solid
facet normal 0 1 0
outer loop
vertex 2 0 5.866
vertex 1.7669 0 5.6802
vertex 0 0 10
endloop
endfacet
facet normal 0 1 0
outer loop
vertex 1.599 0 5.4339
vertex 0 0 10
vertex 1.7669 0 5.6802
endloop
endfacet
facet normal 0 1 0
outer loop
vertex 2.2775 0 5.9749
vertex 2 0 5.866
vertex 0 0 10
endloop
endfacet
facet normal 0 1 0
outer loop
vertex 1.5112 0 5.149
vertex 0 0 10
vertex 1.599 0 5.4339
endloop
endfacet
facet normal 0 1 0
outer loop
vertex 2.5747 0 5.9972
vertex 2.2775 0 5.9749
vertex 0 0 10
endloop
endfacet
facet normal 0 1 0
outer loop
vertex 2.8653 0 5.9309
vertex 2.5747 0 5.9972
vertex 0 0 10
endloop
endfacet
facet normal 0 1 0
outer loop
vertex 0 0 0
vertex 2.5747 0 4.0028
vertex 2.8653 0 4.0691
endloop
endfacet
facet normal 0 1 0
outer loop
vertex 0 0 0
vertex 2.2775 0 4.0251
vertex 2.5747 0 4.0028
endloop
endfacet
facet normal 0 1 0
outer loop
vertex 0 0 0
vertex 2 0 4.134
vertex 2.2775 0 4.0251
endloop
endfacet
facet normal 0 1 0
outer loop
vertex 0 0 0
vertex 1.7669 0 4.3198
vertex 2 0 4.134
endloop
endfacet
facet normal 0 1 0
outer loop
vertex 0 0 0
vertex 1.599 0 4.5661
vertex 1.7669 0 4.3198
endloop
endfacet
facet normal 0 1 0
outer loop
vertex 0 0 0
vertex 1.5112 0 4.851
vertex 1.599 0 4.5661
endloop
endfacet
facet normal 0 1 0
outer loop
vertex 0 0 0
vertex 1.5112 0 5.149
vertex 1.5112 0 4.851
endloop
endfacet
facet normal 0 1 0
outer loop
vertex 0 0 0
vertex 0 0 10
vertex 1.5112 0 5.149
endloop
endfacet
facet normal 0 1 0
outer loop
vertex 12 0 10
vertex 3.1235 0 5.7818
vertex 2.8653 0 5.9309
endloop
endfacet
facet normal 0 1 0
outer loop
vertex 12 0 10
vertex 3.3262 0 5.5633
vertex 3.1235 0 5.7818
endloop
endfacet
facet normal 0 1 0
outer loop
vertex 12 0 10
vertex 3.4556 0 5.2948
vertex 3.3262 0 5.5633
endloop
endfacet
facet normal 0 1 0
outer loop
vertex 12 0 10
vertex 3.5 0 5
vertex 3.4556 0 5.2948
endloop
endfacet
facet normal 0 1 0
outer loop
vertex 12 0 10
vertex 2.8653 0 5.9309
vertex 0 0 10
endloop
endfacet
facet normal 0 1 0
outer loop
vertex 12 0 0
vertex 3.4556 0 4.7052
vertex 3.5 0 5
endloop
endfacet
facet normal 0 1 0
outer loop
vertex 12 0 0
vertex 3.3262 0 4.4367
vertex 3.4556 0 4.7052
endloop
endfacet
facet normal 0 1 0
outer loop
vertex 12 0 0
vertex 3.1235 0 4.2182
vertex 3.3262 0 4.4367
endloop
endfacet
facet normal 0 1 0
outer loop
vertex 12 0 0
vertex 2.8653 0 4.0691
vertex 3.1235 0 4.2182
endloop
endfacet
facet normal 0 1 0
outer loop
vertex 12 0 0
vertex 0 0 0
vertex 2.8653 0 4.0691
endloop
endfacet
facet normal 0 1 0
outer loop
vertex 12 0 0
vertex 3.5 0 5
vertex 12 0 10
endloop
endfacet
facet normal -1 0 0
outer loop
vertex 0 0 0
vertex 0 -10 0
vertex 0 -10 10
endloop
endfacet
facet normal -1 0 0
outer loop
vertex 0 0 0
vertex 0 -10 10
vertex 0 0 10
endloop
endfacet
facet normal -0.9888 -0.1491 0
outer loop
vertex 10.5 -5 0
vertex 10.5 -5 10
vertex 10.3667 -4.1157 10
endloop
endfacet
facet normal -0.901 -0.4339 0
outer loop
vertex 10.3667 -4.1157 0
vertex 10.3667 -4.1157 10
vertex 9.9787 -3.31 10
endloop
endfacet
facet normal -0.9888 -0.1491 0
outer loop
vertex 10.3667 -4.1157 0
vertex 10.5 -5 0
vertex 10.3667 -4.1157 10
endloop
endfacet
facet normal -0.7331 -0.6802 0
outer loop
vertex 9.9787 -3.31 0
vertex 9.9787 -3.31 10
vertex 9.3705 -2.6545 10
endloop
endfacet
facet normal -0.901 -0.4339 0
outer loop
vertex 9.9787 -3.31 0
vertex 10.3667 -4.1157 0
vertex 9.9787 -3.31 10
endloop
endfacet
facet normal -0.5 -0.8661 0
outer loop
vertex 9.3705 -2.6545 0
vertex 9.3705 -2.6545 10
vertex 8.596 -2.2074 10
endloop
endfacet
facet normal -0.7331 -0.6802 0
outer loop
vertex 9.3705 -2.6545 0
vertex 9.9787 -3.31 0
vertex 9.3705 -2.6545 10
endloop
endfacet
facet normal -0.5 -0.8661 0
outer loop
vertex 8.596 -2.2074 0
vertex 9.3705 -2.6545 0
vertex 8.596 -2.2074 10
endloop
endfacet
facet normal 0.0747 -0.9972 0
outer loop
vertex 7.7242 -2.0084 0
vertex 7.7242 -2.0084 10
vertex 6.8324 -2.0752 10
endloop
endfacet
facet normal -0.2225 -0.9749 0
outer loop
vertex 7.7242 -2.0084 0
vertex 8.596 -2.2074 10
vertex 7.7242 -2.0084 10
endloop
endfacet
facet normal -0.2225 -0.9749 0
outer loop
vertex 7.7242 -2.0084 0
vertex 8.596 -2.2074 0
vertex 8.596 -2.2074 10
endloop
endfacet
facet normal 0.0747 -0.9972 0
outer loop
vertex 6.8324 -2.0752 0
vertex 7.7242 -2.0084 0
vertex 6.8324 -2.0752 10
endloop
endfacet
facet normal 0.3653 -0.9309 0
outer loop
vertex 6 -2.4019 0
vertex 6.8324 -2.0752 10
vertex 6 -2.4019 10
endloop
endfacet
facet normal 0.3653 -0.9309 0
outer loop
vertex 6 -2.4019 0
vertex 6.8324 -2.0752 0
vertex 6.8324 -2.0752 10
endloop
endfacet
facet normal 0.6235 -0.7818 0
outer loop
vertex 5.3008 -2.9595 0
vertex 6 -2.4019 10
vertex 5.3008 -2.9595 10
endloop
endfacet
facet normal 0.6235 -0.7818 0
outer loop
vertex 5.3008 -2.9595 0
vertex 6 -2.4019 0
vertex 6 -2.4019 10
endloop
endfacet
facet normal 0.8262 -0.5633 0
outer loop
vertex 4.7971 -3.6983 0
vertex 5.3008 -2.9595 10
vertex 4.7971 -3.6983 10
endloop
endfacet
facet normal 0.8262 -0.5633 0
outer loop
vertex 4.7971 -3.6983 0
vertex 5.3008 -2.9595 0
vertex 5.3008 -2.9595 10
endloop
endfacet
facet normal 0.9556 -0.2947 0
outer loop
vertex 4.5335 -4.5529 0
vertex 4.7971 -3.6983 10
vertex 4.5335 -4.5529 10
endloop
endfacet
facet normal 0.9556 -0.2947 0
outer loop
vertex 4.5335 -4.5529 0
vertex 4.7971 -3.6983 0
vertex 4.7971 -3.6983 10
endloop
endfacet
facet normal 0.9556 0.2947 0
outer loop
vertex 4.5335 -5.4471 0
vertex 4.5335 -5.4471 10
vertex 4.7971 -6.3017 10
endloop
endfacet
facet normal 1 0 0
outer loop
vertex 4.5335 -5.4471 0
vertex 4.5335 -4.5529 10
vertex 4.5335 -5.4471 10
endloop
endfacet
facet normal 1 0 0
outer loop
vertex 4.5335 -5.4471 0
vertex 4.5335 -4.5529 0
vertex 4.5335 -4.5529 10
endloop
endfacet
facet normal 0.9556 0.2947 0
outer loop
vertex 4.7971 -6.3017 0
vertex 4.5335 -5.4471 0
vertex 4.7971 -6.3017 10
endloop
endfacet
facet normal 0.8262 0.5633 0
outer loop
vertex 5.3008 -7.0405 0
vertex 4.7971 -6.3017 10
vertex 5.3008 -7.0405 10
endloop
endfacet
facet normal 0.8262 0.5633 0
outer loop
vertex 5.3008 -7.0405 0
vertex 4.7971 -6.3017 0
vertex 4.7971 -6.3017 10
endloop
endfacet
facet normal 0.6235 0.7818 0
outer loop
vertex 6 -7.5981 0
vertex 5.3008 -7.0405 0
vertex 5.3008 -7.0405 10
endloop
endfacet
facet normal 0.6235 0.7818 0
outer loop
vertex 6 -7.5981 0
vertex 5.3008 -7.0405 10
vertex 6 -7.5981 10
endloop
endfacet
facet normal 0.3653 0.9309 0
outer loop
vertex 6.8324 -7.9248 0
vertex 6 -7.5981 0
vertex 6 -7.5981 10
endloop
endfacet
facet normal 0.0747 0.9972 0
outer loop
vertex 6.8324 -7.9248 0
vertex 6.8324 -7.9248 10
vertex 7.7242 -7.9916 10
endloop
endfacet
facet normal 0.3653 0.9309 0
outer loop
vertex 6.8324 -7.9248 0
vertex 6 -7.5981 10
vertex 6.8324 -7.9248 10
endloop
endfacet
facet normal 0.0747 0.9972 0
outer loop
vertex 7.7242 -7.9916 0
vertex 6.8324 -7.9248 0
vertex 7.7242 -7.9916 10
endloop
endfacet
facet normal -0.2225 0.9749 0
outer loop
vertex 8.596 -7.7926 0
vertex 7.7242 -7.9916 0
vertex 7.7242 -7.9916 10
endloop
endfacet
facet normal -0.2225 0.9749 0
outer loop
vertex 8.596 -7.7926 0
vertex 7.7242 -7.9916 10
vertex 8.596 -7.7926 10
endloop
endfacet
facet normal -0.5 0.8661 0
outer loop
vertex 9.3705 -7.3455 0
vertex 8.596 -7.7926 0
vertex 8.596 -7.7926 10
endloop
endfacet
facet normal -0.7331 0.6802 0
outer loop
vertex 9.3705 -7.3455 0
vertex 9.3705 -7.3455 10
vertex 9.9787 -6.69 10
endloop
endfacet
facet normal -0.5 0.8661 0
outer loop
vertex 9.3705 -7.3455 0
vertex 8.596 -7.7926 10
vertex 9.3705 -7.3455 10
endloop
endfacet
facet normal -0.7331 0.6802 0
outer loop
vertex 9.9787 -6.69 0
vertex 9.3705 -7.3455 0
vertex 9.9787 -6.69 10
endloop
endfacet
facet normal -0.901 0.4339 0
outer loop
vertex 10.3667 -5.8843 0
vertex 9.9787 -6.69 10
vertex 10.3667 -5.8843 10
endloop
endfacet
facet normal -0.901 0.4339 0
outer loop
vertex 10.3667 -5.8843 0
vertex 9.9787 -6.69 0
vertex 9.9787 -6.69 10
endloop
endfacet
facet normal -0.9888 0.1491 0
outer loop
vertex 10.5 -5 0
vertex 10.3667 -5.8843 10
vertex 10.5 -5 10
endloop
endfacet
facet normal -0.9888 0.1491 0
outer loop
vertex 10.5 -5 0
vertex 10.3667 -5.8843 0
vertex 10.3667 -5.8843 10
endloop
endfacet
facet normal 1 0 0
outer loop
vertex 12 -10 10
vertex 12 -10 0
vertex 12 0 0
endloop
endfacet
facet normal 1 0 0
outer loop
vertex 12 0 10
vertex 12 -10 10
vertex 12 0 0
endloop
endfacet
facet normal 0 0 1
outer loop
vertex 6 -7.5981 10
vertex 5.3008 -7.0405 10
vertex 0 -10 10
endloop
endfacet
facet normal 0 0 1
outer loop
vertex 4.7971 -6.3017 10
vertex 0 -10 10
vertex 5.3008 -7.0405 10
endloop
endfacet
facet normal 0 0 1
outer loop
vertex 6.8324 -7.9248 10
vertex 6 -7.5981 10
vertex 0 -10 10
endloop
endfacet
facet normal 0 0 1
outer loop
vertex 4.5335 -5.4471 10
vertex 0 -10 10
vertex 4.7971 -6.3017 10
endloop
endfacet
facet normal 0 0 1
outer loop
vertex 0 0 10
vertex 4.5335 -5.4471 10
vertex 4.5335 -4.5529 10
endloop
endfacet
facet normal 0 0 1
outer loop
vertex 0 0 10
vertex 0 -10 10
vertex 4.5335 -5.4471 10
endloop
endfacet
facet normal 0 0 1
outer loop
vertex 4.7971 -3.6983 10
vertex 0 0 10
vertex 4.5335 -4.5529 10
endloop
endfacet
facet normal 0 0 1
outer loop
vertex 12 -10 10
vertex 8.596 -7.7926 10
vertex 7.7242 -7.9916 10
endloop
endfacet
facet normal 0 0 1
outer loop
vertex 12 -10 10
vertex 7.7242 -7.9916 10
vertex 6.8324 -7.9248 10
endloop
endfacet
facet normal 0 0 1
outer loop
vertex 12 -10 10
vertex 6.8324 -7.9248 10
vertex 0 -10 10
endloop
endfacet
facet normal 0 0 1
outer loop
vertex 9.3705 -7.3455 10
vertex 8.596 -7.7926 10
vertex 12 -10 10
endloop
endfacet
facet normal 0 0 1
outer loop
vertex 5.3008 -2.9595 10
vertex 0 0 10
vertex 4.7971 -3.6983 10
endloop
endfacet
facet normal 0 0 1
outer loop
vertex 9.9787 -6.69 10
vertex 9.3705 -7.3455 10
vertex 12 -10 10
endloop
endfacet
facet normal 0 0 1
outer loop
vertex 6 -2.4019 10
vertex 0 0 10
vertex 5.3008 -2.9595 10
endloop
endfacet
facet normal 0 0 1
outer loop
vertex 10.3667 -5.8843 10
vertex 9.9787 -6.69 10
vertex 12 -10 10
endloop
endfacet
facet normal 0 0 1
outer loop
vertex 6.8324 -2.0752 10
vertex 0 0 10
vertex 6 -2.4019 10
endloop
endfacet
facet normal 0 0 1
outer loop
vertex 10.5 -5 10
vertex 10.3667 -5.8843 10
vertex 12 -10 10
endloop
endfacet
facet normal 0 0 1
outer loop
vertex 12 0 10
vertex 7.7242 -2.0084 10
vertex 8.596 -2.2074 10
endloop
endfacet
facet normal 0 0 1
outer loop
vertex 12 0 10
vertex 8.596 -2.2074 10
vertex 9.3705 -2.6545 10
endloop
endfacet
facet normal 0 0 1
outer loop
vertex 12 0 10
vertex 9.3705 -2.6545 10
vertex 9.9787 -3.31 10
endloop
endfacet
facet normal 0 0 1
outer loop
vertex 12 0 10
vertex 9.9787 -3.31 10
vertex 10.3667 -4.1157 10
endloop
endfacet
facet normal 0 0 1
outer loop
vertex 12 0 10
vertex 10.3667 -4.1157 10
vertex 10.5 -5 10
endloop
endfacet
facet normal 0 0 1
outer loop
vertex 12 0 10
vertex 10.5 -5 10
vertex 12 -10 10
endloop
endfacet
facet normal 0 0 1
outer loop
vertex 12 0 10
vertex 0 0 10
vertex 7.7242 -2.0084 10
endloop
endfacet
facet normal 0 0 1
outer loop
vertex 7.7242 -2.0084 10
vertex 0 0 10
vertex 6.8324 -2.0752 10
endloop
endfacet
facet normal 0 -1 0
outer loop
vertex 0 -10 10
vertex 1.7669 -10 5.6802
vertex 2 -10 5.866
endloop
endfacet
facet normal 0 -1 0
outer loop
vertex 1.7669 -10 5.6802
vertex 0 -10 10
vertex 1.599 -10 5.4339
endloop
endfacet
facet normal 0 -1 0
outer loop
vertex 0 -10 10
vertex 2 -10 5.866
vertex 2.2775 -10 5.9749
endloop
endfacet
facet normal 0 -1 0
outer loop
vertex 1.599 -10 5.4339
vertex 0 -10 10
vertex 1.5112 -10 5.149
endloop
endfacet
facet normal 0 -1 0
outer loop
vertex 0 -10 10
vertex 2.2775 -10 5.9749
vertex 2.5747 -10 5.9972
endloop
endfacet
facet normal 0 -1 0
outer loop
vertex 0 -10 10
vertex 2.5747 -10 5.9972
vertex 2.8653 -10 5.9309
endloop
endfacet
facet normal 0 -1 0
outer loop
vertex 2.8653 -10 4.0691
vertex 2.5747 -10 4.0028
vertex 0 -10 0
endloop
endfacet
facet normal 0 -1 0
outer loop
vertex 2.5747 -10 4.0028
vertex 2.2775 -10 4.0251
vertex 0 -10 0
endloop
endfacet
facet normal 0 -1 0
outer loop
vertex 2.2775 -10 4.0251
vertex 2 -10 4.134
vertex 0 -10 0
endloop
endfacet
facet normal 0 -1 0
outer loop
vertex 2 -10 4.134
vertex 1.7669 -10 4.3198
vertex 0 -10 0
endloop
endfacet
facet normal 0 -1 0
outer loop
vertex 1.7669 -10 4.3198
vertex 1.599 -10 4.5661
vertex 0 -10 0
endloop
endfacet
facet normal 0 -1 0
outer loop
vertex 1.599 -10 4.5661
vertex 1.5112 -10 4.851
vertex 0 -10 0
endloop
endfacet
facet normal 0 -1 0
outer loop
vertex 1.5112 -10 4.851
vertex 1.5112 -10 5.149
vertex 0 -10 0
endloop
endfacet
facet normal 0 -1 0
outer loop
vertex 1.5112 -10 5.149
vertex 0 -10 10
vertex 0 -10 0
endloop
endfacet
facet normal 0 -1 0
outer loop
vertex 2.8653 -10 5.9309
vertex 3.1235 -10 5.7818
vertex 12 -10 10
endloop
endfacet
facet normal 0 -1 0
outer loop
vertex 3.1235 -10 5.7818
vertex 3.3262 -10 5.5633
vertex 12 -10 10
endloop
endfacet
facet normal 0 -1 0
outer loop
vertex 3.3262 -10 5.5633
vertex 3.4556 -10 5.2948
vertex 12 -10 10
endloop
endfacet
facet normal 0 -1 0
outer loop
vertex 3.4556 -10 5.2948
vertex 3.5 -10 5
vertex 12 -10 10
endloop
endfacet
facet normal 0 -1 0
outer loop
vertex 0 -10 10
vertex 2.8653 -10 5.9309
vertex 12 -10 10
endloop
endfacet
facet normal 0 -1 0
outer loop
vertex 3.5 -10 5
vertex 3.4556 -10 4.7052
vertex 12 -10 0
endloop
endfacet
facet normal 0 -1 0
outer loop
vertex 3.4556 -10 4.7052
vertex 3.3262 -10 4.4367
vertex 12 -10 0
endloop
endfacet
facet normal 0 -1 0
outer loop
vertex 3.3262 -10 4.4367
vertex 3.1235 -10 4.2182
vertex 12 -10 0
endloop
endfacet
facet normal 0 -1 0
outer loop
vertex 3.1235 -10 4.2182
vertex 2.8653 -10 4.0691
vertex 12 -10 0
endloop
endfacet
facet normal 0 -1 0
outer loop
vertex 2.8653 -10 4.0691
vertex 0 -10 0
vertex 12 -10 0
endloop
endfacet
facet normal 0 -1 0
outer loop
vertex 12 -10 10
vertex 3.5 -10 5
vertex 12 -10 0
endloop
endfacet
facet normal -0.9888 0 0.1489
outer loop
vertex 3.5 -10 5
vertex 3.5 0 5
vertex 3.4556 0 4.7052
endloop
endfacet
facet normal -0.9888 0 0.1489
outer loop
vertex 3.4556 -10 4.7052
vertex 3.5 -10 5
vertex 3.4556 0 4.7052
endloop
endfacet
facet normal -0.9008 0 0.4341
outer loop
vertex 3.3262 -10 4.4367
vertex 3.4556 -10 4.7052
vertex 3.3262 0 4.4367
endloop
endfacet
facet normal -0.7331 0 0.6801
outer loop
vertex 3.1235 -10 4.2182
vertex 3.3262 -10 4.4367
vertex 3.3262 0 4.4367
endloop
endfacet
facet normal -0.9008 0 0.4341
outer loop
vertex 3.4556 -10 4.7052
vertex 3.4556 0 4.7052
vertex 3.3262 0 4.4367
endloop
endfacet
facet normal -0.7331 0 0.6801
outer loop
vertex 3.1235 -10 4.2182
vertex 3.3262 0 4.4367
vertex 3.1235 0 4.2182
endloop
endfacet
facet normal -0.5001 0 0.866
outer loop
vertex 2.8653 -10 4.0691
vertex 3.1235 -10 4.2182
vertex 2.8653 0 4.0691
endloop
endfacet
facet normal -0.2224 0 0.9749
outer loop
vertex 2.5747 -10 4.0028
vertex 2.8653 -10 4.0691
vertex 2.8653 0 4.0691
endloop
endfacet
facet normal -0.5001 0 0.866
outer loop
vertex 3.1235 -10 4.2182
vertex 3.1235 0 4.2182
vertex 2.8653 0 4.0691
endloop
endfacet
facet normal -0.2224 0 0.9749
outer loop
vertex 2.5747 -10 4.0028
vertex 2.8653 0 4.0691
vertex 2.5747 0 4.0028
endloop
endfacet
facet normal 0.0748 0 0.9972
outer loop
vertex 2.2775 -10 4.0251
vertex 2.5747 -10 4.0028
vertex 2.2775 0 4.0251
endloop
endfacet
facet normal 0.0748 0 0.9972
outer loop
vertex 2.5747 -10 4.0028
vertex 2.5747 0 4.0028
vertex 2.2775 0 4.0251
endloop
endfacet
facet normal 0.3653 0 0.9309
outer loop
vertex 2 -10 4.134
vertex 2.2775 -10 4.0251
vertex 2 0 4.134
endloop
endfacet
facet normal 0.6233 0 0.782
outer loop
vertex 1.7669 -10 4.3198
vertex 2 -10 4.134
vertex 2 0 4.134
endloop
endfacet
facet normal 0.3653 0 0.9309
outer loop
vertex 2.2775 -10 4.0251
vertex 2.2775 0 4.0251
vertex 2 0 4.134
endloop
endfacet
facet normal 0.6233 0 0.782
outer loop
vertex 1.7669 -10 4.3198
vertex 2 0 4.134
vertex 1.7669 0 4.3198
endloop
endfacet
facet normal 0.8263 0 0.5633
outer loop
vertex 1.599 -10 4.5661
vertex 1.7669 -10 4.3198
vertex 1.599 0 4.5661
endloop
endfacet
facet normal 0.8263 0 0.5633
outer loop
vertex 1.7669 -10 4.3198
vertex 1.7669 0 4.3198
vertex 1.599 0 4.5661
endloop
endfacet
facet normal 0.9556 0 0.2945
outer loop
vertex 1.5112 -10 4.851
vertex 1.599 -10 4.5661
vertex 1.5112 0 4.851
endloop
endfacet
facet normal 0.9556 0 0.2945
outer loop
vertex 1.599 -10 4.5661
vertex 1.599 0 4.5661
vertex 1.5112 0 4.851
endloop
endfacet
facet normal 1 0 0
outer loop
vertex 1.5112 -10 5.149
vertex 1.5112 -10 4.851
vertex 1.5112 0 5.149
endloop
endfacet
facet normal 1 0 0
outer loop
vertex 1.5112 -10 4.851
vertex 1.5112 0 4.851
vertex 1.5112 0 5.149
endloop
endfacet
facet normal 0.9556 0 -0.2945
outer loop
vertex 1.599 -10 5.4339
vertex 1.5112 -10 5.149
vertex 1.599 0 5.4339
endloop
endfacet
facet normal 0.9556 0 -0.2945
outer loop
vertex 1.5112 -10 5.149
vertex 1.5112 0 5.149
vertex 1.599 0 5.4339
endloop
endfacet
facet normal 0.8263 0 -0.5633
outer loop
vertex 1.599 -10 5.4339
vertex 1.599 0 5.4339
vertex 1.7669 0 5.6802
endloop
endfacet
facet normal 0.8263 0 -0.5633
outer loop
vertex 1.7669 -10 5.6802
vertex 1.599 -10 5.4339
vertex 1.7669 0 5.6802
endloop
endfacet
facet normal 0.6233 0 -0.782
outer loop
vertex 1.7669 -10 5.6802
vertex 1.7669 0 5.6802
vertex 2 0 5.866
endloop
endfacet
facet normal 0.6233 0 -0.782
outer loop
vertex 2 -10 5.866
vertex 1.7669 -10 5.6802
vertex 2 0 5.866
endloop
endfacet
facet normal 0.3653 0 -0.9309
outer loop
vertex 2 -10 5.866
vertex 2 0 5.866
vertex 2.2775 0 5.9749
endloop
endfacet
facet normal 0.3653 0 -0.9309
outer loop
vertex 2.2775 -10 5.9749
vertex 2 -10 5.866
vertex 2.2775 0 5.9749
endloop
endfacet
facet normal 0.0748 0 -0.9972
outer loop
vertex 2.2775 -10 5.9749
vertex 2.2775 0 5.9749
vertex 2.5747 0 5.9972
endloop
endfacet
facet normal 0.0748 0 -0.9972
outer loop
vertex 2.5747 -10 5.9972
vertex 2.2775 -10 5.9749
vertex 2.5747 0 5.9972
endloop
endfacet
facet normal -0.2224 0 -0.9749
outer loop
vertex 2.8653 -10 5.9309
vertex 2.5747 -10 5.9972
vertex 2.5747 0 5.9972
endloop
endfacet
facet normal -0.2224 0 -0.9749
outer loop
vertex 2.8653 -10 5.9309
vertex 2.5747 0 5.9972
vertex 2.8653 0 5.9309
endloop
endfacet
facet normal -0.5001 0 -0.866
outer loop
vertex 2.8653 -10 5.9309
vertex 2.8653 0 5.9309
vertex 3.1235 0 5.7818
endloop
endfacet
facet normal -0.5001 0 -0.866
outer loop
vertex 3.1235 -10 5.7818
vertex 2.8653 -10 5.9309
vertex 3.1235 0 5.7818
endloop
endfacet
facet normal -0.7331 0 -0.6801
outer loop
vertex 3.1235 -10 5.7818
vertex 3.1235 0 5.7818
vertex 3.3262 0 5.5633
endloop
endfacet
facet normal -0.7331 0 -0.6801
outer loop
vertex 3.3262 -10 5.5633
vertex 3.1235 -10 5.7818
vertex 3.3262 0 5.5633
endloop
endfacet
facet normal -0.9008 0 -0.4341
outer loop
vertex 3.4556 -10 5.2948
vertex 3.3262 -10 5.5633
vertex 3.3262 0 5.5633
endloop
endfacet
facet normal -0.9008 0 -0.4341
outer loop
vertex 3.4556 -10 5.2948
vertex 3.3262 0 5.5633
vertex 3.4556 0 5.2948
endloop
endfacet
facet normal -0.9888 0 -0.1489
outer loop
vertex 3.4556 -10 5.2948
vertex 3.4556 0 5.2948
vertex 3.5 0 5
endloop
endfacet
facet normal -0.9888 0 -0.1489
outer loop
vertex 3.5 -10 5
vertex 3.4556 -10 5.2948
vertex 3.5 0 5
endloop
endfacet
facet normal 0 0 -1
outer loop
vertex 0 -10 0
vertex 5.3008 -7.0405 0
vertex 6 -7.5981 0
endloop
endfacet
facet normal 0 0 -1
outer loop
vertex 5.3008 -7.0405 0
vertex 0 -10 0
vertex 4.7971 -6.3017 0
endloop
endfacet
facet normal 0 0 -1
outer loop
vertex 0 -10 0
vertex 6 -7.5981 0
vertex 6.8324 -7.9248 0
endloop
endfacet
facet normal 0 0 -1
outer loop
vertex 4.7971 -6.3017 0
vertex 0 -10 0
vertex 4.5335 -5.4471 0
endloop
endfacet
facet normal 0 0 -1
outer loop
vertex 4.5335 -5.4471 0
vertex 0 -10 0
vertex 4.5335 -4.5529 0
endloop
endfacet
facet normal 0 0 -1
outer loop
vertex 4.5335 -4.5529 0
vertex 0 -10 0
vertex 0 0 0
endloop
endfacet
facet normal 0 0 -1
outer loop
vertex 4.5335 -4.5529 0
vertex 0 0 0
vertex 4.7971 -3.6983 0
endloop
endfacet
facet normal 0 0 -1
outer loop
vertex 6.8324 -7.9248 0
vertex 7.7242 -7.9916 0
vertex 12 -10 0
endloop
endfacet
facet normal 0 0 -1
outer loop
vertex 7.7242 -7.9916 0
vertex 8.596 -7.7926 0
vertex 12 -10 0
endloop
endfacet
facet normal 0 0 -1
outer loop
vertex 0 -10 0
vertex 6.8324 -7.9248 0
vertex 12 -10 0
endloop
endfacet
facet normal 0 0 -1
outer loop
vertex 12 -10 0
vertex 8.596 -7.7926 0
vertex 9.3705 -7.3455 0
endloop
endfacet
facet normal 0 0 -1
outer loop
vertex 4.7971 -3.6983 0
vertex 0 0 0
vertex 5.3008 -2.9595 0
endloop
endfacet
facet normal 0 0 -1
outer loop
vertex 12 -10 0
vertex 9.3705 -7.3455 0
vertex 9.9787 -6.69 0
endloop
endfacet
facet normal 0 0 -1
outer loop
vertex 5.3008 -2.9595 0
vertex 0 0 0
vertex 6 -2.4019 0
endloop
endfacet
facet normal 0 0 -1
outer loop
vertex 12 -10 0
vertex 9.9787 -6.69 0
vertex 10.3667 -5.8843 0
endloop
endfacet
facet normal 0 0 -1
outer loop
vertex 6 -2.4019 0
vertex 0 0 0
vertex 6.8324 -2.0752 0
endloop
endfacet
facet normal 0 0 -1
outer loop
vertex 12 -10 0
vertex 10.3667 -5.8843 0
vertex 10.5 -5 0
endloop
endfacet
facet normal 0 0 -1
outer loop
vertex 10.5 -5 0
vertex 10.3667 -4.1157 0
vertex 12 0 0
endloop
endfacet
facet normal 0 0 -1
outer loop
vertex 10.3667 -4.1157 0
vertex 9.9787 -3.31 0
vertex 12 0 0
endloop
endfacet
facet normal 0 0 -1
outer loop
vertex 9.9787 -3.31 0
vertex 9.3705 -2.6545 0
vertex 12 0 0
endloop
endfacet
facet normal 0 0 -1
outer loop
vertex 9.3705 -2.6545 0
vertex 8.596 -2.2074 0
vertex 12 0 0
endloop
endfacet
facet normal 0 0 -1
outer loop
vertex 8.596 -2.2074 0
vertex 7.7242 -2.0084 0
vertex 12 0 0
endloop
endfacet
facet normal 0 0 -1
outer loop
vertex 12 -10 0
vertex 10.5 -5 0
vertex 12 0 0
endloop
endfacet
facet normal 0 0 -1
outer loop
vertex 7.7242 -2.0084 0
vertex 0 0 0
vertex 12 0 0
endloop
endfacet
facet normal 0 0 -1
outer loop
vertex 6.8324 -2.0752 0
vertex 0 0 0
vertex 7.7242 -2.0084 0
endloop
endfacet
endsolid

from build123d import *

# Parameters (mm, degrees)
ESQUISSE1_W             = 12
ESQUISSE1_H             = 10
BOSS_EXTRU_1_DEPTH      = 10
ESQUISSE2_R             = 3
ENL_V_MAT_EXTRU_2_DEPTH = 11
ESQUISSE3_R             = 1
ENL_V_MAT_EXTRU_3_DEPTH = 11


with BuildPart() as part:
    # Esquisse1 → Boss.-Extru.1 (new body)
    with BuildSketch(Plane.XY):
        with Locations((6, -5)):
            Rectangle(ESQUISSE1_W, ESQUISSE1_H)
    extrude(amount=BOSS_EXTRU_1_DEPTH)

    # Esquisse2 → Enlèv. mat.-Extru.2 (cut, through all)
    with BuildSketch(Plane.XY):
        with Locations((7.5, -5)):
            Circle(ESQUISSE2_R)
    extrude(amount=ENL_V_MAT_EXTRU_2_DEPTH, mode=Mode.SUBTRACT)

    # Esquisse3 → Enlèv. mat.-Extru.3 (cut, through all)
    with BuildSketch(Plane(origin=(0, 0, 0), x_dir=(1, 0, 0), z_dir=(0, 1, 0))):
        with Locations((2.5, -5)):
            Circle(ESQUISSE3_R)
    extrude(amount=-ENL_V_MAT_EXTRU_3_DEPTH, mode=Mode.SUBTRACT)


solid = part.part
